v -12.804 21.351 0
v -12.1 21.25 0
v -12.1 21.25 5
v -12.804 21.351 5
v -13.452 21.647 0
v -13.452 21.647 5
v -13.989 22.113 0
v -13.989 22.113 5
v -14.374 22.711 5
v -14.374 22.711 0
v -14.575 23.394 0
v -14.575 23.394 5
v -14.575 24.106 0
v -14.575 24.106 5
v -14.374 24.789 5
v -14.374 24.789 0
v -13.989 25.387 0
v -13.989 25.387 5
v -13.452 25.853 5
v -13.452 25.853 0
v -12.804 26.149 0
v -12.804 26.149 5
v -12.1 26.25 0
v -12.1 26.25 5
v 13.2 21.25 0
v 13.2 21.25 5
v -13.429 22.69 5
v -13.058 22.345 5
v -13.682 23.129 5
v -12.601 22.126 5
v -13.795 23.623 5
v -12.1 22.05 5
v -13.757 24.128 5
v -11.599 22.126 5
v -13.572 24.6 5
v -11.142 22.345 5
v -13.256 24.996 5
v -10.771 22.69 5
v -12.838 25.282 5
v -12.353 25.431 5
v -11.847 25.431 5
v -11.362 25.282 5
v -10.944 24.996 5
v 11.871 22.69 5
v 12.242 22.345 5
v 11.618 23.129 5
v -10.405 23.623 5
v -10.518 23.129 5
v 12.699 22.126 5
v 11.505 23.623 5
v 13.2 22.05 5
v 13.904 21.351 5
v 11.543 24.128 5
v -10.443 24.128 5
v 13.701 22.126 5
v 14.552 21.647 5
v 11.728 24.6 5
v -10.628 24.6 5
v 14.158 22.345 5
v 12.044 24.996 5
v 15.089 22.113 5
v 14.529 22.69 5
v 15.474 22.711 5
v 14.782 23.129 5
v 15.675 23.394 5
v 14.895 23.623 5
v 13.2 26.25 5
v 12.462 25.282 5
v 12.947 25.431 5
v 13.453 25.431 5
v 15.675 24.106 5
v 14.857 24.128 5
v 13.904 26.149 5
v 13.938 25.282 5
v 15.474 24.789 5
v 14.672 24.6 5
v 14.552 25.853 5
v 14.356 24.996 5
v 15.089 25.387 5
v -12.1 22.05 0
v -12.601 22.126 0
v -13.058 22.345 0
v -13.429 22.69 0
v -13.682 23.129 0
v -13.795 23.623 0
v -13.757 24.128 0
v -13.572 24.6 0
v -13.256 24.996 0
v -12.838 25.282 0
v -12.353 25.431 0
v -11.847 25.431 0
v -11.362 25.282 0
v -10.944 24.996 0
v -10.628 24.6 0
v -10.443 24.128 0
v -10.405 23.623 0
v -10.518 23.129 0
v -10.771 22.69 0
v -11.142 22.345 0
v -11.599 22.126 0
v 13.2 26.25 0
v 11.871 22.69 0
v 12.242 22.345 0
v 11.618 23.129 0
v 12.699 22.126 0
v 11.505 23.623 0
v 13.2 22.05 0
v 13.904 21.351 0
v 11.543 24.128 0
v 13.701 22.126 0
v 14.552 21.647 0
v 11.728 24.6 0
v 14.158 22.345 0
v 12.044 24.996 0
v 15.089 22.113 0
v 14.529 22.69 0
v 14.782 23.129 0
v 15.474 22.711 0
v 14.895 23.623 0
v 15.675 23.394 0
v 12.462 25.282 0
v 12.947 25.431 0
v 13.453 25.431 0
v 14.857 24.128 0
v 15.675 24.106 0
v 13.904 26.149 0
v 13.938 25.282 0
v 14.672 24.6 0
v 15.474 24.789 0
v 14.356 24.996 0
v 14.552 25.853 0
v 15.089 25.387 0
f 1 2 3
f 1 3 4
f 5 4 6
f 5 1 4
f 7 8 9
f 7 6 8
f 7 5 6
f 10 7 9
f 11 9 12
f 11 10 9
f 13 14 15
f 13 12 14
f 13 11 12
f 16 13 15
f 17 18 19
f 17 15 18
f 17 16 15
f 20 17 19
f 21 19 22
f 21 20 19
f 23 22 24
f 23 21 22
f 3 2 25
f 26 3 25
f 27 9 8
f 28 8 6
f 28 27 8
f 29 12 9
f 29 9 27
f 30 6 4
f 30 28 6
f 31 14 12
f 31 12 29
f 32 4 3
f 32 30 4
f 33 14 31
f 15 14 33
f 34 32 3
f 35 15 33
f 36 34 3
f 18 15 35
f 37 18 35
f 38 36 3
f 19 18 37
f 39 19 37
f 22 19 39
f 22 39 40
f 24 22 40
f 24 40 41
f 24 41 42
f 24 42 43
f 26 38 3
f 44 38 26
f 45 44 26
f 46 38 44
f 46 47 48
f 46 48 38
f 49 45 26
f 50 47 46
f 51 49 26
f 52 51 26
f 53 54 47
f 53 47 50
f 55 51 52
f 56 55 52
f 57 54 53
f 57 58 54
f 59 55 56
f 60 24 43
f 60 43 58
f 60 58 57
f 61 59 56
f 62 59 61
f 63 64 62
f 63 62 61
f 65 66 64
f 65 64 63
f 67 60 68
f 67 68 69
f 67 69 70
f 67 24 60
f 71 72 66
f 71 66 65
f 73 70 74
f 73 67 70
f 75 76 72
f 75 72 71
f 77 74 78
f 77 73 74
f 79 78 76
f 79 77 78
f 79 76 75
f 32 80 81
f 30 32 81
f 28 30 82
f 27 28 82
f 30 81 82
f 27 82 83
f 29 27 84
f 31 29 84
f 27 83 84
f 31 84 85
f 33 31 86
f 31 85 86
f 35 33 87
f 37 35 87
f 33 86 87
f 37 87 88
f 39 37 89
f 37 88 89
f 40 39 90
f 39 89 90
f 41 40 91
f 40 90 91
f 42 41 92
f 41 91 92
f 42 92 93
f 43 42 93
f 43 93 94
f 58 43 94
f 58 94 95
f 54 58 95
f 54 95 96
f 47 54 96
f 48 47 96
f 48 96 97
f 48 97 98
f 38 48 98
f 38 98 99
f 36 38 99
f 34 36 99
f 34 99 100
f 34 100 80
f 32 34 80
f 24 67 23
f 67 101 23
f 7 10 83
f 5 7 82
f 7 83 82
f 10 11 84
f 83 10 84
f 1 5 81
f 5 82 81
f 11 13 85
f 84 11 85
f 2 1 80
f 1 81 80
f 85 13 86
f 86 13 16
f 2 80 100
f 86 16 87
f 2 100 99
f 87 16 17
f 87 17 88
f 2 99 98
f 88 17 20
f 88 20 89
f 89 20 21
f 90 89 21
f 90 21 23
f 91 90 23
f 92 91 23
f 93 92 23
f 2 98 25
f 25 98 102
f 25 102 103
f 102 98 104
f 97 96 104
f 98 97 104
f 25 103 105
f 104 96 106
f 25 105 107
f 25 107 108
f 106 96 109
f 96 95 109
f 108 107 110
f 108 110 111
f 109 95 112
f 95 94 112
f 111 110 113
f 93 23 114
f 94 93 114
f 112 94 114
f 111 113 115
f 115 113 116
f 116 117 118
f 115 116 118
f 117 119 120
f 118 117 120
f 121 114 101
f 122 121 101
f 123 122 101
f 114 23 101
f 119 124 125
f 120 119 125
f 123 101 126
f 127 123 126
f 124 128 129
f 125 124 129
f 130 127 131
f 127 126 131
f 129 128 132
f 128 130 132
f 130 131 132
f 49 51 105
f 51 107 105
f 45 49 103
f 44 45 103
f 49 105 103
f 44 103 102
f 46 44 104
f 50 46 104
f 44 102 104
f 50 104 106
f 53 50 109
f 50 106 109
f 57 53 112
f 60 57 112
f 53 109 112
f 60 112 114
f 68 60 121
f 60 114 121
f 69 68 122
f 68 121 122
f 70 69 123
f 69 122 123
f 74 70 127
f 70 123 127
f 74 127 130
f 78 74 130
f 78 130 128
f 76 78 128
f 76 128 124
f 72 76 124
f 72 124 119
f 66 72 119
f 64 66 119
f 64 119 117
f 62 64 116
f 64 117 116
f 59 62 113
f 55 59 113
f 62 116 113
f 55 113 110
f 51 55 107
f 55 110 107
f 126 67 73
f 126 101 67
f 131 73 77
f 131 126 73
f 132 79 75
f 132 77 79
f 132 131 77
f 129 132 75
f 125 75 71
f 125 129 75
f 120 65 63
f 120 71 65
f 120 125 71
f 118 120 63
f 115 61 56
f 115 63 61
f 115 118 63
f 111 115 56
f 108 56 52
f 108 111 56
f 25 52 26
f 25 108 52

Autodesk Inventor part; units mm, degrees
ref_plane "YZ Plane" through (0, 0, 0) normal (1, 0, 0) x (0, 1, 0)
ref_plane "XZ Plane" through (0, 0, 0) normal (0, 1, 0) x (-1, 0, 0)
ref_plane "XY Plane" through (0, 0, 0) normal (0, 0, 1) x (1, 0, 0)
ref_plane "Work Plane1" through (0, 0, 0) normal (0, 0, 1) x (1, 0, 0)
sketch "Sketch1" plane through (0, 0, 0) normal (0, 0, 1) x (1, 0, 0)
  circle A0 centre (-12.1, 23.75) radius 2.15 construction
  circle A1 centre (13.2, 23.75) radius 2.15 construction
  circle A2 centre (-12.1, 31.75) radius 2.15 construction
  circle A3 centre (13.2, 31.75) radius 2.15 construction
  line L0 (-12.1, 23.75) -> (13.2, 23.75) construction
  line L1 (-12.1, 21.25) -> (13.2, 21.25)
  line L2 (13.2, 26.25) -> (-12.1, 26.25)
  arc A4 (-12.1, 26.25) -> (-12.1, 21.25) centre (-12.1, 23.75) ccw
  arc A5 (13.2, 21.25) -> (13.2, 26.25) centre (13.2, 23.75) ccw
  point P0 (0, 0)
  point P1 (0.55, 23.75)
  dimension "d0" = 5
extrude "Extrusion1" add sketch "Sketch1" along normal blind 5
sketch "Sketch2" plane through (0, 0, 5) normal (0, 0, 1) x (1, 0, 0)
  arc A0 (13.2, 21.25) -> (13.2, 26.25) centre (13.2, 23.75) ccw construction
  line L0 (13.2, 26.25) -> (-12.1, 26.25) construction
  arc A1 (-12.1, 26.25) -> (-12.1, 21.25) centre (-12.1, 23.75) ccw construction
  line L1 (-12.1, 21.25) -> (13.2, 21.25) construction
  point P0 (0, 0)
hole "Hole1" at (13.2, 23.75, 5) at (-12.1, 23.75, 5) direction (0, 0, -1) diameter 3.4 depth 7 clearance for "Countersunk Flat Head Screw DIN EN ISO 2009" size "M3" standard "DIN"
properties part number "TinyBeltClamp"
